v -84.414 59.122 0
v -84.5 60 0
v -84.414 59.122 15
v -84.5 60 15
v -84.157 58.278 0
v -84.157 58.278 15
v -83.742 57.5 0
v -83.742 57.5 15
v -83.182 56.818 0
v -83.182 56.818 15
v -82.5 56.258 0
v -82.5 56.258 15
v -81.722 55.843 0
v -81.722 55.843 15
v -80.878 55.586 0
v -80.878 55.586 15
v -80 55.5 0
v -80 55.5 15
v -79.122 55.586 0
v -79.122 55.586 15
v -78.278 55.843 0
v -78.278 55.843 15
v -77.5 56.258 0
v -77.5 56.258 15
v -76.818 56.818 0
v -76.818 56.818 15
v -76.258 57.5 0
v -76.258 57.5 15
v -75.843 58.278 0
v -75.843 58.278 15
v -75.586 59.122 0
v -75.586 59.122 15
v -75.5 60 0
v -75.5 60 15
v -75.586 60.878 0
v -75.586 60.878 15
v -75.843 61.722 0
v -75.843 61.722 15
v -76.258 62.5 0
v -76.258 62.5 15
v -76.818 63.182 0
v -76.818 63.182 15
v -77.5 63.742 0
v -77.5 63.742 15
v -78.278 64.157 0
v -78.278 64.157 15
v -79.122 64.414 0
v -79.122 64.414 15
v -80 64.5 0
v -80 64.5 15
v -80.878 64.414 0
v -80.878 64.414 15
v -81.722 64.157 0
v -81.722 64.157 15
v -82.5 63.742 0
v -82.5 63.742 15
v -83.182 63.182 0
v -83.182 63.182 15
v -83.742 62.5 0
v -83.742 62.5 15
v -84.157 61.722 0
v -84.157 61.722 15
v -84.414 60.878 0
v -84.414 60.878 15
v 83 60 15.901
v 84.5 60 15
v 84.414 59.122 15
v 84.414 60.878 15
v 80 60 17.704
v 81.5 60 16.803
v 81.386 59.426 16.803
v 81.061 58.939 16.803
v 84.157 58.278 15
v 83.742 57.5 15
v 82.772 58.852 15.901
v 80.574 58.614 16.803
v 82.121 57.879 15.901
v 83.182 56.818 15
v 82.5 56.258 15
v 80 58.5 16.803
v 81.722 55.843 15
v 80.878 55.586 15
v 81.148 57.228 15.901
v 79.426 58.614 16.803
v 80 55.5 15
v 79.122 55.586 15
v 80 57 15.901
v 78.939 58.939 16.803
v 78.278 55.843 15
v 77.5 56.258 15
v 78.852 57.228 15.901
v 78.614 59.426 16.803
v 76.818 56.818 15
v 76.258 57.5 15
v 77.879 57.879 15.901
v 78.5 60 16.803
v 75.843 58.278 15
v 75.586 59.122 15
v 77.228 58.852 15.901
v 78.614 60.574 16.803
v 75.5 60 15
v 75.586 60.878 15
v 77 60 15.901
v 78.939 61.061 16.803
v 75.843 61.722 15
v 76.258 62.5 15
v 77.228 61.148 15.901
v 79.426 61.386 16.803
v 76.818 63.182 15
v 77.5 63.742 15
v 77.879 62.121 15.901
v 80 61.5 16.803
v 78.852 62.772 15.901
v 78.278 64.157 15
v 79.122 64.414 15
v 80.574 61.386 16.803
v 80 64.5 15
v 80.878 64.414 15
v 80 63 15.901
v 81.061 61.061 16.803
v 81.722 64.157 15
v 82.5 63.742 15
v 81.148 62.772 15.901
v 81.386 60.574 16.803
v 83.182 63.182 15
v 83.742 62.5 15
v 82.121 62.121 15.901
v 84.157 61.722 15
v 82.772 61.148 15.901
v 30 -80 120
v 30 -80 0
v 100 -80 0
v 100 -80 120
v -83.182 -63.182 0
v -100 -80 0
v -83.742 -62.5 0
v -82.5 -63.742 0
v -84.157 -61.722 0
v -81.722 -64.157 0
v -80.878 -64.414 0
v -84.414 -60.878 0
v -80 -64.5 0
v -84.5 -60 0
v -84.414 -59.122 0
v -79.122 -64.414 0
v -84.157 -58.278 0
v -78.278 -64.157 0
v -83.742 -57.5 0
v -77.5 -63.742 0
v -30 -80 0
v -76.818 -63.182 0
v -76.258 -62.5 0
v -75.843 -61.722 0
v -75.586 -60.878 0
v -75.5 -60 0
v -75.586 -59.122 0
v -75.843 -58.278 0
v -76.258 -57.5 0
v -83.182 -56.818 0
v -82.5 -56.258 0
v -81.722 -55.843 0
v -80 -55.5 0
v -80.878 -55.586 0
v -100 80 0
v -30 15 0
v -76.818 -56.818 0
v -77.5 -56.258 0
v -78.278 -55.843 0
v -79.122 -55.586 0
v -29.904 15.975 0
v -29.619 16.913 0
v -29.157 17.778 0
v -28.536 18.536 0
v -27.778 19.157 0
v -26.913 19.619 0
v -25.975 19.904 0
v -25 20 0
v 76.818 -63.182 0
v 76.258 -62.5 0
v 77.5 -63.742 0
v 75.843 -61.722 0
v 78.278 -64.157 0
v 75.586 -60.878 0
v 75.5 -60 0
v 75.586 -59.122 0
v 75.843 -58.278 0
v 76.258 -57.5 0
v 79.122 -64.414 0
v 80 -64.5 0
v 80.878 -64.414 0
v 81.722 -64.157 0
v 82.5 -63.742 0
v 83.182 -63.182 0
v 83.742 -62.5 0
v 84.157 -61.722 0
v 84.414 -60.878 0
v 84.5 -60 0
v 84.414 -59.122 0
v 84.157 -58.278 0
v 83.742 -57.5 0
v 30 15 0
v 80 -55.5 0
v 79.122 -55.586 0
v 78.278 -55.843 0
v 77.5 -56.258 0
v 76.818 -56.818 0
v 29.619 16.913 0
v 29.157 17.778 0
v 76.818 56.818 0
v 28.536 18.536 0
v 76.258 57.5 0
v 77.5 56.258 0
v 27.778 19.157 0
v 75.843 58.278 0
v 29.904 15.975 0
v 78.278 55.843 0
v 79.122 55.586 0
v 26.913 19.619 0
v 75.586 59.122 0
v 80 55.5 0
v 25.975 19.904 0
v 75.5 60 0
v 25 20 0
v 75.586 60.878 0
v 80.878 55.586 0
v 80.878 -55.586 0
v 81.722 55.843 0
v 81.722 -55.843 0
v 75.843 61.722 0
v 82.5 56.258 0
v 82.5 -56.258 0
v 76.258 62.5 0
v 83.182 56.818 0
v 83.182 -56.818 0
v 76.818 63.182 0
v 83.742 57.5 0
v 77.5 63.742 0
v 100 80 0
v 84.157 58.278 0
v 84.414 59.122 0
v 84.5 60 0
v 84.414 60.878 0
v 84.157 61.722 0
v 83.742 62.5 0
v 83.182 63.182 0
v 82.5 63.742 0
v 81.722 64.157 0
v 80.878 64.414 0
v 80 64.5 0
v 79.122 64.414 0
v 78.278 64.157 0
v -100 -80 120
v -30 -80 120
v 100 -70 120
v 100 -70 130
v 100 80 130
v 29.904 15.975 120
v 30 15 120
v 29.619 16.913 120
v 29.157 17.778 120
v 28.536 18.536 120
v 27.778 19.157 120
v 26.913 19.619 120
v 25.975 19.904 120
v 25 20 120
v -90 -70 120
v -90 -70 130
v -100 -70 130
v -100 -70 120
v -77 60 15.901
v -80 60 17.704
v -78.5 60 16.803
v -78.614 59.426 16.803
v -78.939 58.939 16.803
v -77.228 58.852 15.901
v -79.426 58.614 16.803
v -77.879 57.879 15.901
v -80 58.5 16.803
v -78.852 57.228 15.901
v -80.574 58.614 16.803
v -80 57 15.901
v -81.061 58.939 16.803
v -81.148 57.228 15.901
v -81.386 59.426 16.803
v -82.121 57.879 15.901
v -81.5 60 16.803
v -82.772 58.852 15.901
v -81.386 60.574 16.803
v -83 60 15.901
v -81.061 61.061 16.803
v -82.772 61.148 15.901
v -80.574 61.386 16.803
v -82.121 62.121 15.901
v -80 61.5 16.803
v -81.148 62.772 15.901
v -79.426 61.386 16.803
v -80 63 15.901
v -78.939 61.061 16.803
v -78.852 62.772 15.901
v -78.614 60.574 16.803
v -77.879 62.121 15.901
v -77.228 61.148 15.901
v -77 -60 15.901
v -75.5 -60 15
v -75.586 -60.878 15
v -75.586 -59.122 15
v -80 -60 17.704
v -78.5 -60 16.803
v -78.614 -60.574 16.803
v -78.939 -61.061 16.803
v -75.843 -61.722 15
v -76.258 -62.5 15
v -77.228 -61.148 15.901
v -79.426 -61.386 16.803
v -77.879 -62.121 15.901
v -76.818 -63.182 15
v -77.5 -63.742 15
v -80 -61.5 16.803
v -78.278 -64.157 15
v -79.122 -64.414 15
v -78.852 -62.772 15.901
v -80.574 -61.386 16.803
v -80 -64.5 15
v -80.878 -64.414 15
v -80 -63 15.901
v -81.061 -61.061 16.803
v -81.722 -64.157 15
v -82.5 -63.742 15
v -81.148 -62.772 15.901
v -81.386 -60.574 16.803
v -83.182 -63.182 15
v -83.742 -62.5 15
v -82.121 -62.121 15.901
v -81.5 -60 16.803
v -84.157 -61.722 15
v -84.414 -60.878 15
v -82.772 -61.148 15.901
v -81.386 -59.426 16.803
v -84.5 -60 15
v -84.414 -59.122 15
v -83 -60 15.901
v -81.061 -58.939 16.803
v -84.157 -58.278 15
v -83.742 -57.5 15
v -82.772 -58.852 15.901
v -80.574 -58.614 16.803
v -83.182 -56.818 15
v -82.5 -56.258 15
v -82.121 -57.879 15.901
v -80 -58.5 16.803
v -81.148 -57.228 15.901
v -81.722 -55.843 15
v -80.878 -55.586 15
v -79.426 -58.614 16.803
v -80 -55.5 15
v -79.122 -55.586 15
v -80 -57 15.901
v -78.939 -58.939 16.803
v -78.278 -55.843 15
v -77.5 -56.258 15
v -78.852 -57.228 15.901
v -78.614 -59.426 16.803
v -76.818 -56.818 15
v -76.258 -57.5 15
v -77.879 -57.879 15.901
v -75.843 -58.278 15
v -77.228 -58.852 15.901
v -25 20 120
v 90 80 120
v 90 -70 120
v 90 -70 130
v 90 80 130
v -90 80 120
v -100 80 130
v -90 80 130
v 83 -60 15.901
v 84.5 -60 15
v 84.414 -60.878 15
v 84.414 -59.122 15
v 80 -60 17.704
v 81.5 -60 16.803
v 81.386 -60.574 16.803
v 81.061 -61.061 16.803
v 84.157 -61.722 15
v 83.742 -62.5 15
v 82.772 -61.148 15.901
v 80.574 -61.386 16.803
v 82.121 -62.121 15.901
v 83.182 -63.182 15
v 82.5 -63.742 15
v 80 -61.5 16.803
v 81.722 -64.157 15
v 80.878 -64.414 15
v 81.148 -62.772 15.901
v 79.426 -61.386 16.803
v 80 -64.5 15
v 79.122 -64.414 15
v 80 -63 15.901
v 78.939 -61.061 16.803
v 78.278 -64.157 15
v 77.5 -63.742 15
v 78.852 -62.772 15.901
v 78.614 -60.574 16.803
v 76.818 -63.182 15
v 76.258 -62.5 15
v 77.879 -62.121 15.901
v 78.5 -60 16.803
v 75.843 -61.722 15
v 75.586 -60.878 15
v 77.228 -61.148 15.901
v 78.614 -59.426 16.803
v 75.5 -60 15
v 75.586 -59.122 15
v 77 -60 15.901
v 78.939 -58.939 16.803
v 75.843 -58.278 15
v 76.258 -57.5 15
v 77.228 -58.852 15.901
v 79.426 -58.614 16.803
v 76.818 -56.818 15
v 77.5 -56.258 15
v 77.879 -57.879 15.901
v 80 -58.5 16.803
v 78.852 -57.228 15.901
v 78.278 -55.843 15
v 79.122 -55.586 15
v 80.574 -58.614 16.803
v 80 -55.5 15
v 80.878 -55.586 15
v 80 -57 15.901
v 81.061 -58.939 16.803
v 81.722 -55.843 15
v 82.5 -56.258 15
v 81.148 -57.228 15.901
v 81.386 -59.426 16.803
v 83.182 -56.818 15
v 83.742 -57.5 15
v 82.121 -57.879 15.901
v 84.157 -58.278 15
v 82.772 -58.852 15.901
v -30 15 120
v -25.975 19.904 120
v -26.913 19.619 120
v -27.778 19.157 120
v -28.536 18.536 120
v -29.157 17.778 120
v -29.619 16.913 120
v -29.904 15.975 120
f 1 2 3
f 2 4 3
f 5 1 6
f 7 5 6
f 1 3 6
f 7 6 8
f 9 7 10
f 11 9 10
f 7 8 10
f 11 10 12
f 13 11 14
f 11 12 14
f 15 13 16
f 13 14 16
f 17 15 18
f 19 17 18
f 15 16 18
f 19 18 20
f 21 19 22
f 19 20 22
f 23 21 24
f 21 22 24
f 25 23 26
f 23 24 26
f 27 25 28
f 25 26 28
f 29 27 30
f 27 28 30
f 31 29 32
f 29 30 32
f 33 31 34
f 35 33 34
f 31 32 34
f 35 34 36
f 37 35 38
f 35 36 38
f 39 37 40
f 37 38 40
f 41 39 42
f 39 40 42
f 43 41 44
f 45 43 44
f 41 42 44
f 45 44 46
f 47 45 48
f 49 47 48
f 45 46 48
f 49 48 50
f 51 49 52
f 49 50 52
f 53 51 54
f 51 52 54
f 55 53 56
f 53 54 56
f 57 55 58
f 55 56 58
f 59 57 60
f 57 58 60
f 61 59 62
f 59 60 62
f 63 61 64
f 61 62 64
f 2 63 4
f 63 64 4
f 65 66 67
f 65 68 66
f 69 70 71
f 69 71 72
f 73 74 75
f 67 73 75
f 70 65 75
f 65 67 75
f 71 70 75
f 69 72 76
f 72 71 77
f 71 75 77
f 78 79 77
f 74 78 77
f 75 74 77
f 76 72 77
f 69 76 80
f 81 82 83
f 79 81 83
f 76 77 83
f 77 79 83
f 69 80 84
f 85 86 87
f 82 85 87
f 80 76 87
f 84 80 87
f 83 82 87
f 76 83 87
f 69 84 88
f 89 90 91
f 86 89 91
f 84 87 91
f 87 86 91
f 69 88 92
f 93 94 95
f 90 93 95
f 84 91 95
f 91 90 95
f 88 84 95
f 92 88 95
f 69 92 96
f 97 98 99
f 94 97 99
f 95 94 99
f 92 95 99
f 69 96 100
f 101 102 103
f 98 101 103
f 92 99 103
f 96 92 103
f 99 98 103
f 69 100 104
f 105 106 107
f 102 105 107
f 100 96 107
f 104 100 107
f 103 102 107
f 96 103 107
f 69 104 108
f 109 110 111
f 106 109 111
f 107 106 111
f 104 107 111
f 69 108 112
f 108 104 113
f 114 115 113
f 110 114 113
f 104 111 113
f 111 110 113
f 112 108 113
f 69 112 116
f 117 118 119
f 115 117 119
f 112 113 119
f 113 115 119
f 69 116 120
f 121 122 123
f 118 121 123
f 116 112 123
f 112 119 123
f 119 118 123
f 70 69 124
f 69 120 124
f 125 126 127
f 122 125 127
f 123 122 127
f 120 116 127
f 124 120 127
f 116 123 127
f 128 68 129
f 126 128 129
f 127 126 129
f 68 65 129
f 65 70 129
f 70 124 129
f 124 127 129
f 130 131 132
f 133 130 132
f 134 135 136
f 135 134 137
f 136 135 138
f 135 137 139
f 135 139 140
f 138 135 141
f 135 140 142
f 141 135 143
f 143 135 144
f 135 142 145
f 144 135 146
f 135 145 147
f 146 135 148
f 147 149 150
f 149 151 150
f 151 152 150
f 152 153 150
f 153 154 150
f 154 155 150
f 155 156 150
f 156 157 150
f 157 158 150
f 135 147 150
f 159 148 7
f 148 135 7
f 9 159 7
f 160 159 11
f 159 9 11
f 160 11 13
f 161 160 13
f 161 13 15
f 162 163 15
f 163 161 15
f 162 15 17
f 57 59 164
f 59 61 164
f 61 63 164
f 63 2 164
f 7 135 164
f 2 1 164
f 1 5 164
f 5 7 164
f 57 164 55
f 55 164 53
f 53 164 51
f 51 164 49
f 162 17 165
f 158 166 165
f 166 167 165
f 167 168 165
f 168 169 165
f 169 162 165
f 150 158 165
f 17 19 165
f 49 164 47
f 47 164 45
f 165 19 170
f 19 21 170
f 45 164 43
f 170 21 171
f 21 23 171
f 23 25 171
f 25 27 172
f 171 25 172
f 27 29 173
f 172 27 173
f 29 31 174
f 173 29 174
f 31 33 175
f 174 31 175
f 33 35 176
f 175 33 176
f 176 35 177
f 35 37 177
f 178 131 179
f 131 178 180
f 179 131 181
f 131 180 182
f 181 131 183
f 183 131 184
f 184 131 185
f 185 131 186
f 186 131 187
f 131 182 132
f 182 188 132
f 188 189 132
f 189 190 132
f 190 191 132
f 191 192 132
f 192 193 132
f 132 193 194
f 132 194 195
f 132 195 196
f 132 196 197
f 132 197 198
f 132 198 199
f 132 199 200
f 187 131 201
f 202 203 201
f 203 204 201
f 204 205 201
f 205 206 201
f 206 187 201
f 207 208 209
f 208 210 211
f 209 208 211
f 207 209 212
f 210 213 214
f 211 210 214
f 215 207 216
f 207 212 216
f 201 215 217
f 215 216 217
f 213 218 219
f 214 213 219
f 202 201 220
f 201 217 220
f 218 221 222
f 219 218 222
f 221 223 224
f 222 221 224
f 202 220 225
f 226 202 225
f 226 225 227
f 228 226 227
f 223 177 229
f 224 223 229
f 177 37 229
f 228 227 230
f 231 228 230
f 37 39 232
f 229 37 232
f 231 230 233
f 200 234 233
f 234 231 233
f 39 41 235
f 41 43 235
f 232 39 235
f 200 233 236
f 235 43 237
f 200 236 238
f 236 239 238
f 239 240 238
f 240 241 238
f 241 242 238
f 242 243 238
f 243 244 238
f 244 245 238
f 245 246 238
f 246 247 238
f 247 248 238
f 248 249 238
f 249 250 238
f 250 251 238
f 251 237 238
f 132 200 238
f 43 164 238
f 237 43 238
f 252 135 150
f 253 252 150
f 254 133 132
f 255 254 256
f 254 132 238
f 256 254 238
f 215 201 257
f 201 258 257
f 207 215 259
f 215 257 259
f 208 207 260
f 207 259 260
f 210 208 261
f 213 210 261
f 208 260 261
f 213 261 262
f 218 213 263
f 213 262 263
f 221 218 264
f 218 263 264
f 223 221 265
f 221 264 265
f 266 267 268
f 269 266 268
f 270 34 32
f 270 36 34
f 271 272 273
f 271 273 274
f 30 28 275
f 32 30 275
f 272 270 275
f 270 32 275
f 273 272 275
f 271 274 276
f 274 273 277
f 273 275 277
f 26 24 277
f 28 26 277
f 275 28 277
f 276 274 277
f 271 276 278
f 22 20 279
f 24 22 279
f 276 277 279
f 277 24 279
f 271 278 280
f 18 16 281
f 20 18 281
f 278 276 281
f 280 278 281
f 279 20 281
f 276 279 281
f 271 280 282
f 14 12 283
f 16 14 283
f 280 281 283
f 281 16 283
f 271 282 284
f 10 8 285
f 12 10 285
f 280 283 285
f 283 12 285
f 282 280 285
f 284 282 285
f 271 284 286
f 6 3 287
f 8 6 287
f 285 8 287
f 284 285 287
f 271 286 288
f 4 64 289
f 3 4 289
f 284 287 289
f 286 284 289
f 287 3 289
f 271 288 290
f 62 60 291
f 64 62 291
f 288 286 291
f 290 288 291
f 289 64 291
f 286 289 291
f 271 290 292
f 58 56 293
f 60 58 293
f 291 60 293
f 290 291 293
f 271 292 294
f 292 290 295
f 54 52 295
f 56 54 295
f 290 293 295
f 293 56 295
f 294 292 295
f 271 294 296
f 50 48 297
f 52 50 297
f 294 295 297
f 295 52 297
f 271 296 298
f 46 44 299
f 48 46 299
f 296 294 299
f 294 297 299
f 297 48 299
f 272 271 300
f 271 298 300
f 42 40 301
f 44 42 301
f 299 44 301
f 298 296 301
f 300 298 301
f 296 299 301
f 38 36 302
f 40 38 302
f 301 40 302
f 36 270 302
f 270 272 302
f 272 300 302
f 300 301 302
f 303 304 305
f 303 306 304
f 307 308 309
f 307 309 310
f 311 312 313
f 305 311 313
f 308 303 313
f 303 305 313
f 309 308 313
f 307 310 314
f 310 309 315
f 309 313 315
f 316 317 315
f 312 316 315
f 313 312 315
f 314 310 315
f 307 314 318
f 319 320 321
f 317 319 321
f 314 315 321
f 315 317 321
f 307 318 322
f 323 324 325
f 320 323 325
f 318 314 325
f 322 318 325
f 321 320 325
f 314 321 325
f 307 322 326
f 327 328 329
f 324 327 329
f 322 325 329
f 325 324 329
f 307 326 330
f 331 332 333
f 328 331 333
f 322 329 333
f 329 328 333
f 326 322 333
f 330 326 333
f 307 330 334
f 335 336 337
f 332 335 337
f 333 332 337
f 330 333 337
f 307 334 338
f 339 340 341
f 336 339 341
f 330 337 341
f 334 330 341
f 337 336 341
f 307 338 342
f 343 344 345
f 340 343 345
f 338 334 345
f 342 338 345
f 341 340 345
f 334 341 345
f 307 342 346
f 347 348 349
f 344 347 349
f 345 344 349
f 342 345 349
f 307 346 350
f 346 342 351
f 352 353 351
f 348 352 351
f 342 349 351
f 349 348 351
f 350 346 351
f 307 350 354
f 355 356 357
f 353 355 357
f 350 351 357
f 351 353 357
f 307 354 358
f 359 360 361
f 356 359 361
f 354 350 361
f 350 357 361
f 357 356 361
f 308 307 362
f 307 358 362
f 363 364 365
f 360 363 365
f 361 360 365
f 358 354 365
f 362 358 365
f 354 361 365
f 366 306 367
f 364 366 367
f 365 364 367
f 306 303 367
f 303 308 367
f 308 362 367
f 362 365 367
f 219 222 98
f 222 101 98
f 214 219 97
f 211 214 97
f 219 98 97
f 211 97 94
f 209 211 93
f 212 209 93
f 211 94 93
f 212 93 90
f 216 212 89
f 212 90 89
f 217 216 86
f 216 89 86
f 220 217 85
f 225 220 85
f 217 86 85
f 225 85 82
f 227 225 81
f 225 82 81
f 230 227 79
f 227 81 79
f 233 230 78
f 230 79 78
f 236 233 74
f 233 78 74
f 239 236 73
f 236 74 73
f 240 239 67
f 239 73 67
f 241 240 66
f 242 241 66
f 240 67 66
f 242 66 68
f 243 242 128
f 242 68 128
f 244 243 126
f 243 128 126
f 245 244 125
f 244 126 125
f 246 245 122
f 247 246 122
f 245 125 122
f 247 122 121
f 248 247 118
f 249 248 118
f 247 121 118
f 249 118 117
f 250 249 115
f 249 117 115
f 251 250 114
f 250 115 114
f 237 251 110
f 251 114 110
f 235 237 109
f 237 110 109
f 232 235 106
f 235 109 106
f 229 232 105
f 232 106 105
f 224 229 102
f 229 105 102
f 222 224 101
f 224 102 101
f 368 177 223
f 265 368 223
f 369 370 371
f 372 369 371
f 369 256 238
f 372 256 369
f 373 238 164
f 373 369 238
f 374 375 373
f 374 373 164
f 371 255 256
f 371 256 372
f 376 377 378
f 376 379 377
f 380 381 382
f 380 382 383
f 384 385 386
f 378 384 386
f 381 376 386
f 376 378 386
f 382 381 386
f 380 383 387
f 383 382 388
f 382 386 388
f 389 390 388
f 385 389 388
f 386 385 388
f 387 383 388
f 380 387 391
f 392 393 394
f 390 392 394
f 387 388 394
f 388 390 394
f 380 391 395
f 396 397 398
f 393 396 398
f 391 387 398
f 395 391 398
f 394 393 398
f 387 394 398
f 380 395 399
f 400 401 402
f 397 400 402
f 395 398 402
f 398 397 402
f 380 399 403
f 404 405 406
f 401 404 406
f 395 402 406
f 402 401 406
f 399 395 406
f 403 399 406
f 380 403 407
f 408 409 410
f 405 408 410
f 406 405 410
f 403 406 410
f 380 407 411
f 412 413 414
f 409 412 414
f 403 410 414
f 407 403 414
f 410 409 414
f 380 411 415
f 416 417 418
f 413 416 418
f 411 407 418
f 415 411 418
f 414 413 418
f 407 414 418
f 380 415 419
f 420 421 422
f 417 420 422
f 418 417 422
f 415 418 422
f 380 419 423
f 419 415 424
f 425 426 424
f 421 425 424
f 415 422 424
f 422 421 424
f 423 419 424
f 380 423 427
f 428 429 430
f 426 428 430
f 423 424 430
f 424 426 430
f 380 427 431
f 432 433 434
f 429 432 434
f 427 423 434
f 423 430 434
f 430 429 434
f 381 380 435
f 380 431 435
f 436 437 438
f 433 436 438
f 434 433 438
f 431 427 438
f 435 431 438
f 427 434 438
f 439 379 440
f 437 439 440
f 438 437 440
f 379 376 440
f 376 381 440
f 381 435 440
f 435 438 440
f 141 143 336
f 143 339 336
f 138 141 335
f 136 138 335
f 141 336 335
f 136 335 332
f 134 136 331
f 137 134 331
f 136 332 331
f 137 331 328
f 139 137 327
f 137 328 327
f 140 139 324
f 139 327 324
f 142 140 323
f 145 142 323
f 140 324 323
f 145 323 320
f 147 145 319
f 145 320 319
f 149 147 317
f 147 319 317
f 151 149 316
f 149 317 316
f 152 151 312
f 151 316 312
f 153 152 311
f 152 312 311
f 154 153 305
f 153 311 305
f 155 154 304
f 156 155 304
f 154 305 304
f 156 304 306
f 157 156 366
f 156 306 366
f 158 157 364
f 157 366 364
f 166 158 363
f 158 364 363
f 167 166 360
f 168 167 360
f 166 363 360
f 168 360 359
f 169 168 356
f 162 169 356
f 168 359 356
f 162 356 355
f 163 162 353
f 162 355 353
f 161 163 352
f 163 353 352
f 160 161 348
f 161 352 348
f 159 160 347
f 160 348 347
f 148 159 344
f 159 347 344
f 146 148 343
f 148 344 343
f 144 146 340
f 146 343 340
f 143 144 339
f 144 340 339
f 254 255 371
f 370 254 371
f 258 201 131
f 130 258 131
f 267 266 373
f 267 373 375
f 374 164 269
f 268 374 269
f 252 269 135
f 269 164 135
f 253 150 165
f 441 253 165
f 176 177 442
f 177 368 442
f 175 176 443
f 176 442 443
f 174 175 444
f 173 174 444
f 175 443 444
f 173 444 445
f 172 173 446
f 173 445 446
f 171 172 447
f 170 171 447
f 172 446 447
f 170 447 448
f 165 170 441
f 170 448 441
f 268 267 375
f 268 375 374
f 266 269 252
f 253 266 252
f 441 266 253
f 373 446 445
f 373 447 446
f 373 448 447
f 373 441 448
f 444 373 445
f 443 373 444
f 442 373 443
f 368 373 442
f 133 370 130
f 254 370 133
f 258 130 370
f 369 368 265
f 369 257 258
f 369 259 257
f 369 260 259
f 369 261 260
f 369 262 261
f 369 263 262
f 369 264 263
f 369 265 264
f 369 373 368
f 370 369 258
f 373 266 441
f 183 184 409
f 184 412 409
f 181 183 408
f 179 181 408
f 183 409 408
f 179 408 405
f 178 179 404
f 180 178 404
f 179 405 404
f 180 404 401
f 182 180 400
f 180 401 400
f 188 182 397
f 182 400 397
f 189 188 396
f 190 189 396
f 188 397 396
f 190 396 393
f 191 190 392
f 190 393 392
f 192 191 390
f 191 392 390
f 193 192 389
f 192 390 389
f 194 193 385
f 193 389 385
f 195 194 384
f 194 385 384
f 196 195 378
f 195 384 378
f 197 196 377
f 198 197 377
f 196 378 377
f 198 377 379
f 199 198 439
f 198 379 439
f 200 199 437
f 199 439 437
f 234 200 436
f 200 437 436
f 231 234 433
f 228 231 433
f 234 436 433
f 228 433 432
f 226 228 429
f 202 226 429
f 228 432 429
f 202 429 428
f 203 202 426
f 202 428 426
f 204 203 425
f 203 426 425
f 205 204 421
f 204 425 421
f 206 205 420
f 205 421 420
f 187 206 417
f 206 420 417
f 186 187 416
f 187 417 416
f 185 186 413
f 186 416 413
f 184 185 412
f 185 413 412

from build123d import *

# Parameters (mm, degrees)
F1_DEPTH = 120
F4_W     = 10
F4_H     = 10
F5_DEPTH = 150
F6_D     = 9
F6_DEPTH = 15
F6_TIP   = 2.7038727856
F7_R     = 5


# Not quite as in the source:
# - a feature names something its author has since deleted; it is built from what else it names


with BuildPart() as f1:
    # F0 (on Top) → F1 (new body)
    with BuildSketch(Plane.XY):
        Polygon((100, -80), (100, 80), (-100, 80), (-100, -80), (-55, -80), (-30, -80), (-30, -10), (-30, 20), (30, 20), (30, -16.3740634173), (30, -80), (55, -80), align=None)
    extrude(amount=F1_DEPTH)

    # F4 (on face) → F5 (join)
    with BuildSketch(Plane(origin=(0, 80, 0), x_dir=(-1, 0, 0), z_dir=(0, 1, 0))):
        with Locations((95, 125)):
            Rectangle(F4_W, F4_H)
        with Locations((-95, 125)):
            Rectangle(F4_W, F4_H)
    extrude(amount=-F5_DEPTH)

    # F6
    with Locations(Plane(origin=(0, 0, 0), x_dir=(1, 0, 0), z_dir=(0, 0, -1))):
        with Locations((-80, -60), (-80, 60), (80, 60), (80, -60)):
            Hole(F6_D / 2, depth=F6_DEPTH)
            with Locations((0, 0, -(F6_DEPTH + F6_TIP / 2))):  # 118° drill point
                Cone(0, F6_D / 2, F6_TIP, mode=Mode.SUBTRACT)

    # F7
    f7_edges = [f1.edges().sort_by_distance(p)[0] for p in [
        (-30, 20, 60),
        (30, 20, 60),
    ]]
    fillet(f7_edges, radius=F7_R)


solid = f1.part
